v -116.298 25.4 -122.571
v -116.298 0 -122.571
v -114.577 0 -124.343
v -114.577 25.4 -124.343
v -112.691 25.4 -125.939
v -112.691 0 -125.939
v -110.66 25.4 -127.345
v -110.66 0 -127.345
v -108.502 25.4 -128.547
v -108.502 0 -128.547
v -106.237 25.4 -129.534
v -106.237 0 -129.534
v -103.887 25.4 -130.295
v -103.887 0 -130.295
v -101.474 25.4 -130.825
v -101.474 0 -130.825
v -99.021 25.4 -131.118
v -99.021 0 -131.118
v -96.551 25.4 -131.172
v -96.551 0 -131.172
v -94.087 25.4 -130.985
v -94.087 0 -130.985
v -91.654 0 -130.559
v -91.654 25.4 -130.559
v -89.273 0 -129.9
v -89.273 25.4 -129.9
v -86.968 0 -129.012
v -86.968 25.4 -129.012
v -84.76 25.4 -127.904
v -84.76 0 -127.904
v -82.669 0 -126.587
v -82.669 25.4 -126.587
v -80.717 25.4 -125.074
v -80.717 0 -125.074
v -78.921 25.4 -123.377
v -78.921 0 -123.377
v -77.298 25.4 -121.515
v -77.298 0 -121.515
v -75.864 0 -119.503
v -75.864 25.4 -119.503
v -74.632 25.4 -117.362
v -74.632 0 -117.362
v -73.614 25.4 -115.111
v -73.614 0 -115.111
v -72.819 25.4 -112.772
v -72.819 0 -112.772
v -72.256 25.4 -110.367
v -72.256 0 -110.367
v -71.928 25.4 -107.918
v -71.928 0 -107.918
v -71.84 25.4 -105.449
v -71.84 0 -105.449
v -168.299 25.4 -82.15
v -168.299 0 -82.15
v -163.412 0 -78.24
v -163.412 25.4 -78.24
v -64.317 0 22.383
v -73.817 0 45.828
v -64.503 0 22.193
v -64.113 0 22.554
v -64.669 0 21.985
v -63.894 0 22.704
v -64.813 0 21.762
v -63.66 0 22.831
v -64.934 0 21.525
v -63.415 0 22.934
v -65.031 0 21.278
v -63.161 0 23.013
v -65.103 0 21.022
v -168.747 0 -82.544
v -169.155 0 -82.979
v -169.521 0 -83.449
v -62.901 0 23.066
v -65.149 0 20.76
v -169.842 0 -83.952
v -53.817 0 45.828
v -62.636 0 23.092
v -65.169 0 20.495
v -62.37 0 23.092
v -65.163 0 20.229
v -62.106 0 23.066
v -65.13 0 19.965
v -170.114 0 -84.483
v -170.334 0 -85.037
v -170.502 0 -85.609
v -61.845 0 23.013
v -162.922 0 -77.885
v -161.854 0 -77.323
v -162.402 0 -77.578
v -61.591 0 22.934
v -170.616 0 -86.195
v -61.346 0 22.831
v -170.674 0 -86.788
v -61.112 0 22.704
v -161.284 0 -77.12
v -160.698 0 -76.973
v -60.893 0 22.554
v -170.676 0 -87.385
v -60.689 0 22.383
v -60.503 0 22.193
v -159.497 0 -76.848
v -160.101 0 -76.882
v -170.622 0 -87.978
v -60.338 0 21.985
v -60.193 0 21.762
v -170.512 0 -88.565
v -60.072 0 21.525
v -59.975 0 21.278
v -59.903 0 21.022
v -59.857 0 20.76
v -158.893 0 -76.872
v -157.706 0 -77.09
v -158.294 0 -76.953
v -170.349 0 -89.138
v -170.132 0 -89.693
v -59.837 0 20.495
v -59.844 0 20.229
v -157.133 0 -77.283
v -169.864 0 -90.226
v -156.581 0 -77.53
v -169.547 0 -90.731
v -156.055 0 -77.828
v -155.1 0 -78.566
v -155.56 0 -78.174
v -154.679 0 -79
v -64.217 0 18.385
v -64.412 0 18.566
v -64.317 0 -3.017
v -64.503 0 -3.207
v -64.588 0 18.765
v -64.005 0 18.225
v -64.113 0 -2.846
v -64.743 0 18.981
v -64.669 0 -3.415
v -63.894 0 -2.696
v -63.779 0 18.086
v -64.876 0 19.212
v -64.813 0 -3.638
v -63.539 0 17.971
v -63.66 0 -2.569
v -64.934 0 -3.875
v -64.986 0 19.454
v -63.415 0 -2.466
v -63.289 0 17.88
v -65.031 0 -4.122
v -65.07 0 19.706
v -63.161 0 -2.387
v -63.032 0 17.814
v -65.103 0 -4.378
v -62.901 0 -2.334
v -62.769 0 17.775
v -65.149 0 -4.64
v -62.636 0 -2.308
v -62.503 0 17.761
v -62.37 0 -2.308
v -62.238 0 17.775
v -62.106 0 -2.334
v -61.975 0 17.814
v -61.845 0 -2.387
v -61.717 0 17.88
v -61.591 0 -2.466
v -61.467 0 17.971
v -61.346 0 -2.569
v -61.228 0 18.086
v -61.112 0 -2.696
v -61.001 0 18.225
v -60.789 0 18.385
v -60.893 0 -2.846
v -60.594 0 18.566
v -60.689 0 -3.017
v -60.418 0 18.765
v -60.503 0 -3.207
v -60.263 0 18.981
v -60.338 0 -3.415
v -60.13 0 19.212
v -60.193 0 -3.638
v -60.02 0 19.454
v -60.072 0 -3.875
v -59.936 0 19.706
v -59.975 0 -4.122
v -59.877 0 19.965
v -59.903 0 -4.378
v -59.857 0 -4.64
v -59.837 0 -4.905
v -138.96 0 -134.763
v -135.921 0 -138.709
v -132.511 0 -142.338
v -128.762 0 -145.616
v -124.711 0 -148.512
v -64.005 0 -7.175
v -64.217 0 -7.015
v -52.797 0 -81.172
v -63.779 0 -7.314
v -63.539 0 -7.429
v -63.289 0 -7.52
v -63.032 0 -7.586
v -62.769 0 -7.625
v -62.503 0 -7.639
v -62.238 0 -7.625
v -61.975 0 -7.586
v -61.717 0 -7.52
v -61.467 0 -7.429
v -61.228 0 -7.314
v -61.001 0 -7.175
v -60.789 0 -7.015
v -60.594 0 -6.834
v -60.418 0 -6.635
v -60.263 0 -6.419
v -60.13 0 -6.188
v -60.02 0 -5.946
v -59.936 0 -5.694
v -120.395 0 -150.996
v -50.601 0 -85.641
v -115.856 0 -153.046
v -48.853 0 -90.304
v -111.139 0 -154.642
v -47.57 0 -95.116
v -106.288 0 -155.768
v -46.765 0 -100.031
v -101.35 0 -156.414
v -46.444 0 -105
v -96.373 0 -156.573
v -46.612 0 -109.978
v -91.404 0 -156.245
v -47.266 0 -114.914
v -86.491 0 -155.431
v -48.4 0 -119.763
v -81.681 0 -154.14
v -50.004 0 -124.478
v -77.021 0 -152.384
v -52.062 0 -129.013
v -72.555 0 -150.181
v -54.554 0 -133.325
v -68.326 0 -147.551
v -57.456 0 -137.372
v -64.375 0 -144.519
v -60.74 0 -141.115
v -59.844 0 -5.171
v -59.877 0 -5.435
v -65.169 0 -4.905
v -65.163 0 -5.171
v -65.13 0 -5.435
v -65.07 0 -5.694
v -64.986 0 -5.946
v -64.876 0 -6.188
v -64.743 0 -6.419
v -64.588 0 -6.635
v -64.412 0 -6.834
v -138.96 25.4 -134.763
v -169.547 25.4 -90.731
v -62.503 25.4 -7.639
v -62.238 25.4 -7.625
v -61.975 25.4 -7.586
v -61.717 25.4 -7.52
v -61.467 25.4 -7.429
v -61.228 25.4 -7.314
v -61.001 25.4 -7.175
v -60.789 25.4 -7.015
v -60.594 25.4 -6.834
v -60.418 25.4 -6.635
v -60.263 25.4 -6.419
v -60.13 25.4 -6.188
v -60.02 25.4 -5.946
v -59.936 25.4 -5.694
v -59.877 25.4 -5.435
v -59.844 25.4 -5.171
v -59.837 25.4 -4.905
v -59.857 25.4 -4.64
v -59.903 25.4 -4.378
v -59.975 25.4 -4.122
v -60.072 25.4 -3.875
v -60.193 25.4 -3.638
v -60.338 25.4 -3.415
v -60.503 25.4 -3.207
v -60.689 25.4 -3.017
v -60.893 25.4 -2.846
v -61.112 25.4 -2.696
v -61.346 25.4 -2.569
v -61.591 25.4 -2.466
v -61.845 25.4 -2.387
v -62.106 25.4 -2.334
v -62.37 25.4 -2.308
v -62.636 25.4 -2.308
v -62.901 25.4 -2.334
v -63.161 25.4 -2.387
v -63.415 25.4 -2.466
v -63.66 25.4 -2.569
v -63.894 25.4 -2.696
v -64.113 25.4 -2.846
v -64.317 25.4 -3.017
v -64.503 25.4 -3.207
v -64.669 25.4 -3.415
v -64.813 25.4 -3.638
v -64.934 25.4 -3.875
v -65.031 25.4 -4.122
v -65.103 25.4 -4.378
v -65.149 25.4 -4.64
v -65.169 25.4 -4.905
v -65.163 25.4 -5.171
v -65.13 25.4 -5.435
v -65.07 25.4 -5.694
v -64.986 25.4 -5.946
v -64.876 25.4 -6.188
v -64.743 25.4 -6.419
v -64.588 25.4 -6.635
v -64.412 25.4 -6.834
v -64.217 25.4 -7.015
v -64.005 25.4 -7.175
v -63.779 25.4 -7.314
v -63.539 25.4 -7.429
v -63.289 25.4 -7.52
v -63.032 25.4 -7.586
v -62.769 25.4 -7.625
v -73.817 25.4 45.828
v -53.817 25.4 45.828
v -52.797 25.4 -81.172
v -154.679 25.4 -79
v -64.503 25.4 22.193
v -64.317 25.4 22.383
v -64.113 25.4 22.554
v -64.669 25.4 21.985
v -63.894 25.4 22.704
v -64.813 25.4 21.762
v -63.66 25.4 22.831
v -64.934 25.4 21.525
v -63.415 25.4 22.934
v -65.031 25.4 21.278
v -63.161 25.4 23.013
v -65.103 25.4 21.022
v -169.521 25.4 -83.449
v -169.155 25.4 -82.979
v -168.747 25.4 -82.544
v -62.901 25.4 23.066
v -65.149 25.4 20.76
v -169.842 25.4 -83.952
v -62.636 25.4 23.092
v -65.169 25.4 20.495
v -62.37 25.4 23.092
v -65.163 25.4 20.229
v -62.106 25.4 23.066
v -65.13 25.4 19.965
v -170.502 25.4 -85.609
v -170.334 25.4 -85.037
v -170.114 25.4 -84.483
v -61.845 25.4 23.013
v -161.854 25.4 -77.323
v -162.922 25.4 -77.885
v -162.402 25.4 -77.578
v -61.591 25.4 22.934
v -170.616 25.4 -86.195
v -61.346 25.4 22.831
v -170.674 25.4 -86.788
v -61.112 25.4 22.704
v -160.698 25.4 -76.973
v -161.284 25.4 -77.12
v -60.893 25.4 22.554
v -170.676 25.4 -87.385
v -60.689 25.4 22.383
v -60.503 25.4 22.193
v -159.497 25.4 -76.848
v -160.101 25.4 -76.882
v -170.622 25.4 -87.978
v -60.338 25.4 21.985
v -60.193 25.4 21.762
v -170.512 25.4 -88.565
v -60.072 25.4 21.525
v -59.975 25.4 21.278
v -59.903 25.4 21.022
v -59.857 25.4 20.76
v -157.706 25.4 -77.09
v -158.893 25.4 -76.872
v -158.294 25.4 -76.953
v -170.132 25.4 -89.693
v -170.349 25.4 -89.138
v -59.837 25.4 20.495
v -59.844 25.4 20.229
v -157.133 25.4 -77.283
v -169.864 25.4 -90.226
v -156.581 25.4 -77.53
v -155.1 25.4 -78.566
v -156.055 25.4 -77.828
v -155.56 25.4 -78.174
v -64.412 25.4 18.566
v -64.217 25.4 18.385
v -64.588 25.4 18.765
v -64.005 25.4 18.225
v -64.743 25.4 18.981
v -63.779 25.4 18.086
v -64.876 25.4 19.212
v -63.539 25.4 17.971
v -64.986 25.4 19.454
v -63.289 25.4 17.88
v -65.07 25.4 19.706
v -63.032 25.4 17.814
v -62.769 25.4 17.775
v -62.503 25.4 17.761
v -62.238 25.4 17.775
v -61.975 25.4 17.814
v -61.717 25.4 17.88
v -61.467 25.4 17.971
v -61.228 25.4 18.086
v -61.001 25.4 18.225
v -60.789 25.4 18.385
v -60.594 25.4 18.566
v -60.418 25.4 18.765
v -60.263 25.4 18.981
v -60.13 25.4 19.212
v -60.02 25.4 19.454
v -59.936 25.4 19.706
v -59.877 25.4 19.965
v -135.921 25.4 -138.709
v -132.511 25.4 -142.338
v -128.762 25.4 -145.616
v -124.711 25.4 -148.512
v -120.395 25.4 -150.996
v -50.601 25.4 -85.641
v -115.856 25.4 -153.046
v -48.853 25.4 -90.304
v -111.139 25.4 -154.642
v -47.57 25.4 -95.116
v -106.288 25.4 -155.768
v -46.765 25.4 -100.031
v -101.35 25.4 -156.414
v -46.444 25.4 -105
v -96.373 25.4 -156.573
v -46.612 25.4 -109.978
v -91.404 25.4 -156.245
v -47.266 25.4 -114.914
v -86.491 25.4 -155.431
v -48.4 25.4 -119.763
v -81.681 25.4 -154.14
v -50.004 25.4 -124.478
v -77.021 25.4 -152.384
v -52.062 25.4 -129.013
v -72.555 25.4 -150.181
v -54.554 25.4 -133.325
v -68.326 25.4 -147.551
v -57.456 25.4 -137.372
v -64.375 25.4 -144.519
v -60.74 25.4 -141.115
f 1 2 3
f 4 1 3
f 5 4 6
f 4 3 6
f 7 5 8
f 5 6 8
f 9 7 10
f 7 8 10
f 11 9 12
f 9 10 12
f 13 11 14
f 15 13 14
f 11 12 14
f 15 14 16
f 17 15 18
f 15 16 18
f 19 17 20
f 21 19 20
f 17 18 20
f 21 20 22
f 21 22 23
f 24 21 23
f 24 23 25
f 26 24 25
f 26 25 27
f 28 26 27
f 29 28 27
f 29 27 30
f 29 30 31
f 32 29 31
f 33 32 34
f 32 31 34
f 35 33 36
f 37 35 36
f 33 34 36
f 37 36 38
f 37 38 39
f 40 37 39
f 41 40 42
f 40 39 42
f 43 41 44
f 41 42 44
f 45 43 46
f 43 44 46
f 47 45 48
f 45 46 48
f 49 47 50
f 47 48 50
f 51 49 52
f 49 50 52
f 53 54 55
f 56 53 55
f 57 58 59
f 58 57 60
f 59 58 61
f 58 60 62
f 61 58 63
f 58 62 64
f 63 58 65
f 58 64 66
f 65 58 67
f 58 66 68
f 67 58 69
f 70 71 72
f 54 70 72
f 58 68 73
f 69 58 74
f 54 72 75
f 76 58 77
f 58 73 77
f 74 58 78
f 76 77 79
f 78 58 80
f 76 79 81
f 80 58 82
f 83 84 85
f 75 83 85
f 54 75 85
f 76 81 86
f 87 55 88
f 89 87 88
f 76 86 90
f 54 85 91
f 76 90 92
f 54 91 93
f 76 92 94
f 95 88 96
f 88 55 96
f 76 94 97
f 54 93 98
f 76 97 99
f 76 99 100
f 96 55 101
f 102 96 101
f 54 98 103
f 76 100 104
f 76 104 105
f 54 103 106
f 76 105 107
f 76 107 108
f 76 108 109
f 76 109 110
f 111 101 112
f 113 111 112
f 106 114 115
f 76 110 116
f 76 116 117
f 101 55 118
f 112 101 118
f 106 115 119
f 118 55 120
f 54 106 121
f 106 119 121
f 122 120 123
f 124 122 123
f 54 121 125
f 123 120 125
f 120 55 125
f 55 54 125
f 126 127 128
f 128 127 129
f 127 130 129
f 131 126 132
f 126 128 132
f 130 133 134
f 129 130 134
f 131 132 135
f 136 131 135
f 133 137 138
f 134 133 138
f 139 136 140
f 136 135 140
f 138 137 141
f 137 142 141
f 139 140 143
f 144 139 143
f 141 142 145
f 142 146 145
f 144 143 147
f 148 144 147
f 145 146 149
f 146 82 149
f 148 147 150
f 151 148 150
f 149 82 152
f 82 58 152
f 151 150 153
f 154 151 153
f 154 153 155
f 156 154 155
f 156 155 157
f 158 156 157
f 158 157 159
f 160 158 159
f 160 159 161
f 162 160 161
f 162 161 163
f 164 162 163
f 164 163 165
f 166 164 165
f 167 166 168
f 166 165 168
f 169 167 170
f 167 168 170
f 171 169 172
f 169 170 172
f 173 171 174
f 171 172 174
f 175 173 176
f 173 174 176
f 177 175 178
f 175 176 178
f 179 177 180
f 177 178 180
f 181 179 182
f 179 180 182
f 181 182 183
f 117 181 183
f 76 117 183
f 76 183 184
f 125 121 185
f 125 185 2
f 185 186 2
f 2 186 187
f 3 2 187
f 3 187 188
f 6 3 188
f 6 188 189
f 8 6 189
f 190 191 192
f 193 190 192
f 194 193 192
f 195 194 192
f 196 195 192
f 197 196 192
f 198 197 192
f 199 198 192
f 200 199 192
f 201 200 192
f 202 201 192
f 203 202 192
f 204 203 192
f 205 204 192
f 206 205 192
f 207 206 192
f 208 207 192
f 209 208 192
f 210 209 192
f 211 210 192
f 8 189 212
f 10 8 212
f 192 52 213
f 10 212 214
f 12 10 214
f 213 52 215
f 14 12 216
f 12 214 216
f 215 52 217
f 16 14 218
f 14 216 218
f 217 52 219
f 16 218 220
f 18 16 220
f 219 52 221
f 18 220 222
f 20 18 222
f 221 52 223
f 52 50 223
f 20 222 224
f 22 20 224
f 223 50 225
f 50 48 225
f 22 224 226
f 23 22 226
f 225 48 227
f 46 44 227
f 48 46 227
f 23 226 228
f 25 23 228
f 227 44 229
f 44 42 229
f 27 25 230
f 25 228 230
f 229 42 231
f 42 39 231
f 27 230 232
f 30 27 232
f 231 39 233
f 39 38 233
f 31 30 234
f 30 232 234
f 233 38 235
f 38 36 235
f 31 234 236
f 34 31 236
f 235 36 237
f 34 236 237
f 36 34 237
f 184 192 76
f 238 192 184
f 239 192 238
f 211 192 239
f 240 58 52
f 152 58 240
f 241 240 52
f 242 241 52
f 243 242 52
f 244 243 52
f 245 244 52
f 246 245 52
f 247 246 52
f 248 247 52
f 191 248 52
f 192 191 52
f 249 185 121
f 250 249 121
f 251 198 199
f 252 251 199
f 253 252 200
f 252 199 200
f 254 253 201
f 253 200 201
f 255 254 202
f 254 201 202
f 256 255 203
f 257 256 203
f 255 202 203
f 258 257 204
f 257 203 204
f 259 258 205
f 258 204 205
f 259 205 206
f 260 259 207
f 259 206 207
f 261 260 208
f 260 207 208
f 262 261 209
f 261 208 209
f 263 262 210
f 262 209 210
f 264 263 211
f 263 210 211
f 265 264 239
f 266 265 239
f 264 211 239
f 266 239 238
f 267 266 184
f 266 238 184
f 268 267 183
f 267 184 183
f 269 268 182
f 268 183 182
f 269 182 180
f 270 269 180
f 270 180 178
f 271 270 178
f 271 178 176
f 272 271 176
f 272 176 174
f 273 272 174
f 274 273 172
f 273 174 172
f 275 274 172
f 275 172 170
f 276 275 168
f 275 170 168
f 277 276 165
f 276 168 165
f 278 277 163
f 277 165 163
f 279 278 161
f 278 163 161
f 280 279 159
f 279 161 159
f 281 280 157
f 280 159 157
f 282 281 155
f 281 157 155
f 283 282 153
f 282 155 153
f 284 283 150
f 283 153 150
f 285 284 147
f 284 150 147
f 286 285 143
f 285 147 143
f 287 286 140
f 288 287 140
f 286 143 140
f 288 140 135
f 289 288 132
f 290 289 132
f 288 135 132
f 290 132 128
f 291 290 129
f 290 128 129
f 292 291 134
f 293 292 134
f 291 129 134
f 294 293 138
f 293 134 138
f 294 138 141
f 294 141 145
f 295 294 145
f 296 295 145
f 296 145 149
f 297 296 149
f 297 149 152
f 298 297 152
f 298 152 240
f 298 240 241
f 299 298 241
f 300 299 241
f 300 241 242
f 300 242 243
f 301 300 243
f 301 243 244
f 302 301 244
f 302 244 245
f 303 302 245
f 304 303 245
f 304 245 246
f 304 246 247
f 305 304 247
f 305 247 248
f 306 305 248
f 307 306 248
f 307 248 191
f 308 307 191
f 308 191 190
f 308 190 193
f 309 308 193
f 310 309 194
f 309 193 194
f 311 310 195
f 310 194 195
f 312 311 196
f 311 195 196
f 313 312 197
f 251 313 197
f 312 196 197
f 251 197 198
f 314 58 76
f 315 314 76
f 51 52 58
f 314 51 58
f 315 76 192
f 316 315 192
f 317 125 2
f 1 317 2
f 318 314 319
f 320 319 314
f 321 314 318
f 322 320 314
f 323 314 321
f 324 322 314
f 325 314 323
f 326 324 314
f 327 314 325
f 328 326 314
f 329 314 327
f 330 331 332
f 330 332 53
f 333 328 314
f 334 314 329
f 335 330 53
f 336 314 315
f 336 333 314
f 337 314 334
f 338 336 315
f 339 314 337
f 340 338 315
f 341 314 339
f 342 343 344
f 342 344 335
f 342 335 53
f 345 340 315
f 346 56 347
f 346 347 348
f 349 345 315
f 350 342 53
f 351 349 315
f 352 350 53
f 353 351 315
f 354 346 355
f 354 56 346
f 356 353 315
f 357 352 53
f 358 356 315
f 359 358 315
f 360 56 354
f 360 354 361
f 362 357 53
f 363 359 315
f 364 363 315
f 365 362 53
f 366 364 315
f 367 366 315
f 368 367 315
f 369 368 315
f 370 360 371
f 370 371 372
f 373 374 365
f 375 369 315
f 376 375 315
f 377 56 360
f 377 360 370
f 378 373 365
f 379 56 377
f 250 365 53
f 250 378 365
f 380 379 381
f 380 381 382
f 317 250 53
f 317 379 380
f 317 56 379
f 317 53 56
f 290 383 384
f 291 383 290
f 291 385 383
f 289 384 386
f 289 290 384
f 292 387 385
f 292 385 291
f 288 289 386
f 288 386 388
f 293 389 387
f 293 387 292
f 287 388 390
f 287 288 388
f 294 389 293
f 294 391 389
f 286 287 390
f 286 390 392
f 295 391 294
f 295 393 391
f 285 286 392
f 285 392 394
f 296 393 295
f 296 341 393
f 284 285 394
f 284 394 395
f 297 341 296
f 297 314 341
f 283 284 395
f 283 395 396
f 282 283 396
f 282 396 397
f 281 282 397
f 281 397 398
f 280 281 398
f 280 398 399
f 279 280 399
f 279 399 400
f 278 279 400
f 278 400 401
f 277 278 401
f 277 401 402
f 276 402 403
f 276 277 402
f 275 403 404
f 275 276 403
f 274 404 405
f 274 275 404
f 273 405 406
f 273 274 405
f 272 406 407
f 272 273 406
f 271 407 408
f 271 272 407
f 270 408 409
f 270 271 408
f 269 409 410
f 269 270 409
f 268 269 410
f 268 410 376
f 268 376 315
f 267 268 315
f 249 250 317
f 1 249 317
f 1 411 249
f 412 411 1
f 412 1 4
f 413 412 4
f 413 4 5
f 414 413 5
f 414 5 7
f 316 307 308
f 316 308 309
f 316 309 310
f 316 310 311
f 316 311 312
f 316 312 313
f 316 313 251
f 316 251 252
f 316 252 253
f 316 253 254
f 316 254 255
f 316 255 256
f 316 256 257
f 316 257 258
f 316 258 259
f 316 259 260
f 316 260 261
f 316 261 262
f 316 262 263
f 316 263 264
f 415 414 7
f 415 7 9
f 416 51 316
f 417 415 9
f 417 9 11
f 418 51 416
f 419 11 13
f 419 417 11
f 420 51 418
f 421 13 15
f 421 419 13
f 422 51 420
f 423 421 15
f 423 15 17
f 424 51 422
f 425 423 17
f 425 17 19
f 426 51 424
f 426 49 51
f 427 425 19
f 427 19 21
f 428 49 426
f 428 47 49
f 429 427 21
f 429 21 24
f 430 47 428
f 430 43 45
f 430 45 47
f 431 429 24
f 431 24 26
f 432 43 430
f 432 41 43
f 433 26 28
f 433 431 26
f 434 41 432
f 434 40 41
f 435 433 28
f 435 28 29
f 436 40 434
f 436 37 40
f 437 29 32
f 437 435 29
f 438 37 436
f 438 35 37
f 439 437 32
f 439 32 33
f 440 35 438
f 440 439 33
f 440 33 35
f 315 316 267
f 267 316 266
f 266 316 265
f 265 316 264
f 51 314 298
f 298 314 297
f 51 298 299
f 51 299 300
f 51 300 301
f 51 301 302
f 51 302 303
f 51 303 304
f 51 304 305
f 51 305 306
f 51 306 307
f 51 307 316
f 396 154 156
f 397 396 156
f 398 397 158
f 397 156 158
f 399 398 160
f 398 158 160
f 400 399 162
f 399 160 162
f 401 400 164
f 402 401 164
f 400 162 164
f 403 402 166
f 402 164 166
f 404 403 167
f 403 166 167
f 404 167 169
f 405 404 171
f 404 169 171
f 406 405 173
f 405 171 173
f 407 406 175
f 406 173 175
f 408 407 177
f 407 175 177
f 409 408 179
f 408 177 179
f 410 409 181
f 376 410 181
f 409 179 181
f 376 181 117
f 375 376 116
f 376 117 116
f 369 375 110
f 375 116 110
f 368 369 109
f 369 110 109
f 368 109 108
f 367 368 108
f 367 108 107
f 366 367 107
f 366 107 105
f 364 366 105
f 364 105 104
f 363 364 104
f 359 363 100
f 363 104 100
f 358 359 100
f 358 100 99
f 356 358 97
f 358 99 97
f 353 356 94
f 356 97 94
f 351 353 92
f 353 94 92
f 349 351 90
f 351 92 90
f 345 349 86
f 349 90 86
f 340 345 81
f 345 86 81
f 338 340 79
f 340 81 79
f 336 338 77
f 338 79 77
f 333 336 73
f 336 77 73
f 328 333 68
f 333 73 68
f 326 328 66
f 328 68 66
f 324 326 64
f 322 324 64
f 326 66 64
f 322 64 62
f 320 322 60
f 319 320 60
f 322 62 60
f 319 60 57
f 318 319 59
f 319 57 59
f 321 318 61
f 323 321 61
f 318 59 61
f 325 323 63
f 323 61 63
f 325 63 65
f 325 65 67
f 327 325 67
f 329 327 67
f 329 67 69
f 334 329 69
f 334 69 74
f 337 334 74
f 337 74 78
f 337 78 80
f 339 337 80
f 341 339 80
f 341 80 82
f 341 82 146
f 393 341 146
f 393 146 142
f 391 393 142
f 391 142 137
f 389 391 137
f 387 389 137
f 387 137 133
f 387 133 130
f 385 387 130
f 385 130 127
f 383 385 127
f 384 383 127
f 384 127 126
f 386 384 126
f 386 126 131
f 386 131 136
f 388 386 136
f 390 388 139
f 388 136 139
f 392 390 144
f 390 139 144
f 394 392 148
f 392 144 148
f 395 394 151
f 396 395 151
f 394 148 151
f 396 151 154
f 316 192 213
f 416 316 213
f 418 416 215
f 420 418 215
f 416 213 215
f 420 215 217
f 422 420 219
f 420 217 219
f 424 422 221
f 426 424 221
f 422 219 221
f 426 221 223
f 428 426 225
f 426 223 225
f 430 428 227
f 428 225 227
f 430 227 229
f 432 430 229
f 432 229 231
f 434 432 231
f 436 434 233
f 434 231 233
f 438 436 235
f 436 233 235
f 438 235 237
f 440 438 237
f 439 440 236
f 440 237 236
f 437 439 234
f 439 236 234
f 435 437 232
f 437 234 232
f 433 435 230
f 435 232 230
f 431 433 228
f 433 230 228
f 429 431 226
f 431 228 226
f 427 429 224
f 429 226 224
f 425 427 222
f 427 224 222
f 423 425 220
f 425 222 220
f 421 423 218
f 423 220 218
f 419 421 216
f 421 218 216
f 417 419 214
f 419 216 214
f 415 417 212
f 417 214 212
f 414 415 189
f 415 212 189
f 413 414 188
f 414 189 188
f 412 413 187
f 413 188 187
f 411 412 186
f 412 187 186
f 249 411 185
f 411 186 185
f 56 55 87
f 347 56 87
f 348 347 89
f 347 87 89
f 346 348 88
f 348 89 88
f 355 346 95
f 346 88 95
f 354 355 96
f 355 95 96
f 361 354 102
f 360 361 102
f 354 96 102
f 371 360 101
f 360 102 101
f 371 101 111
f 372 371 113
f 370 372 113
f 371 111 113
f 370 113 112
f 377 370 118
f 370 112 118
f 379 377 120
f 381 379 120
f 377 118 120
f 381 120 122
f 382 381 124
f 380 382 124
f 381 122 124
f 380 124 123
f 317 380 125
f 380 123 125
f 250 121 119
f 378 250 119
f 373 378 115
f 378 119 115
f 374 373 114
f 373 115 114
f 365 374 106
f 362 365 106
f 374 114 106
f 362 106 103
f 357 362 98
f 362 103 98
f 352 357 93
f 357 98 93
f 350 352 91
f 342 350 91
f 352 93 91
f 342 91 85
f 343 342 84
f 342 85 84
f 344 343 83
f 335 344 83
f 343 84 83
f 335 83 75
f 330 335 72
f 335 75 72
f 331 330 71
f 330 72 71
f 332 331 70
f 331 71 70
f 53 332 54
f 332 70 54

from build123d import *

# Parameters (mm, degrees)
BOSS_EXTRUDE1_DEPTH = 25.4
SKETCH2_R           = 2.667
CUT_EXTRUDE1_DEPTH  = 25.4


with BuildPart() as part:
    # Sketch1 → Boss-Extrude1 (new body)
    with BuildSketch(Plane(origin=(0, 0, 0), x_dir=(1, 0, 0), z_dir=(0, 1, 0))):
        with BuildLine():
            Line((-73.81674099, -45.828335303), (-53.81674099, -45.828335303))
            Line((-53.81674099, -45.828335303), (-52.796976786, 81.171664697))
            ThreePointArc((-52.796976786, 81.171664697), (-70.408048373, 148.917605355), (-138.959581609, 134.763114577))
            Line((-138.959581609, 134.763114577), (-169.546861653, 90.731300142))
            ThreePointArc((-169.546861653, 90.731300142), (-170.615608999, 86.194762182), (-168.299108962, 82.150479165))
            Line((-168.299108962, 82.150479165), (-163.411771612, 78.239641616))
            ThreePointArc((-163.411771612, 78.239641616), (-158.893349235, 76.871631311), (-154.679488648, 79.000239288))
            Line((-154.679488648, 79.000239288), (-116.297746729, 122.570612572))
            ThreePointArc((-116.297746729, 122.570612572), (-88.109701276, 129.483790907), (-71.840430534, 105.449049996))
            Line((-71.840430534, 105.449049996), (-73.81674099, -45.828335303))
        make_face()
    extrude(amount=BOSS_EXTRUDE1_DEPTH)

    # Sketch2 → Cut-Extrude1 (cut)
    with BuildSketch(Plane(origin=(0, 0, 0), x_dir=(-1, 0, 0), z_dir=(0, -1, 0))):
        with Locations(Location((62.503074737, 4.971664697, 0), (0, 0, 90))):
            Circle(SKETCH2_R)
        with Locations(Location((62.503074737, -20.428335303, 0), (0, 0, 90))):
            Circle(SKETCH2_R)
    extrude(amount=-CUT_EXTRUDE1_DEPTH, mode=Mode.SUBTRACT)


solid = part.part
